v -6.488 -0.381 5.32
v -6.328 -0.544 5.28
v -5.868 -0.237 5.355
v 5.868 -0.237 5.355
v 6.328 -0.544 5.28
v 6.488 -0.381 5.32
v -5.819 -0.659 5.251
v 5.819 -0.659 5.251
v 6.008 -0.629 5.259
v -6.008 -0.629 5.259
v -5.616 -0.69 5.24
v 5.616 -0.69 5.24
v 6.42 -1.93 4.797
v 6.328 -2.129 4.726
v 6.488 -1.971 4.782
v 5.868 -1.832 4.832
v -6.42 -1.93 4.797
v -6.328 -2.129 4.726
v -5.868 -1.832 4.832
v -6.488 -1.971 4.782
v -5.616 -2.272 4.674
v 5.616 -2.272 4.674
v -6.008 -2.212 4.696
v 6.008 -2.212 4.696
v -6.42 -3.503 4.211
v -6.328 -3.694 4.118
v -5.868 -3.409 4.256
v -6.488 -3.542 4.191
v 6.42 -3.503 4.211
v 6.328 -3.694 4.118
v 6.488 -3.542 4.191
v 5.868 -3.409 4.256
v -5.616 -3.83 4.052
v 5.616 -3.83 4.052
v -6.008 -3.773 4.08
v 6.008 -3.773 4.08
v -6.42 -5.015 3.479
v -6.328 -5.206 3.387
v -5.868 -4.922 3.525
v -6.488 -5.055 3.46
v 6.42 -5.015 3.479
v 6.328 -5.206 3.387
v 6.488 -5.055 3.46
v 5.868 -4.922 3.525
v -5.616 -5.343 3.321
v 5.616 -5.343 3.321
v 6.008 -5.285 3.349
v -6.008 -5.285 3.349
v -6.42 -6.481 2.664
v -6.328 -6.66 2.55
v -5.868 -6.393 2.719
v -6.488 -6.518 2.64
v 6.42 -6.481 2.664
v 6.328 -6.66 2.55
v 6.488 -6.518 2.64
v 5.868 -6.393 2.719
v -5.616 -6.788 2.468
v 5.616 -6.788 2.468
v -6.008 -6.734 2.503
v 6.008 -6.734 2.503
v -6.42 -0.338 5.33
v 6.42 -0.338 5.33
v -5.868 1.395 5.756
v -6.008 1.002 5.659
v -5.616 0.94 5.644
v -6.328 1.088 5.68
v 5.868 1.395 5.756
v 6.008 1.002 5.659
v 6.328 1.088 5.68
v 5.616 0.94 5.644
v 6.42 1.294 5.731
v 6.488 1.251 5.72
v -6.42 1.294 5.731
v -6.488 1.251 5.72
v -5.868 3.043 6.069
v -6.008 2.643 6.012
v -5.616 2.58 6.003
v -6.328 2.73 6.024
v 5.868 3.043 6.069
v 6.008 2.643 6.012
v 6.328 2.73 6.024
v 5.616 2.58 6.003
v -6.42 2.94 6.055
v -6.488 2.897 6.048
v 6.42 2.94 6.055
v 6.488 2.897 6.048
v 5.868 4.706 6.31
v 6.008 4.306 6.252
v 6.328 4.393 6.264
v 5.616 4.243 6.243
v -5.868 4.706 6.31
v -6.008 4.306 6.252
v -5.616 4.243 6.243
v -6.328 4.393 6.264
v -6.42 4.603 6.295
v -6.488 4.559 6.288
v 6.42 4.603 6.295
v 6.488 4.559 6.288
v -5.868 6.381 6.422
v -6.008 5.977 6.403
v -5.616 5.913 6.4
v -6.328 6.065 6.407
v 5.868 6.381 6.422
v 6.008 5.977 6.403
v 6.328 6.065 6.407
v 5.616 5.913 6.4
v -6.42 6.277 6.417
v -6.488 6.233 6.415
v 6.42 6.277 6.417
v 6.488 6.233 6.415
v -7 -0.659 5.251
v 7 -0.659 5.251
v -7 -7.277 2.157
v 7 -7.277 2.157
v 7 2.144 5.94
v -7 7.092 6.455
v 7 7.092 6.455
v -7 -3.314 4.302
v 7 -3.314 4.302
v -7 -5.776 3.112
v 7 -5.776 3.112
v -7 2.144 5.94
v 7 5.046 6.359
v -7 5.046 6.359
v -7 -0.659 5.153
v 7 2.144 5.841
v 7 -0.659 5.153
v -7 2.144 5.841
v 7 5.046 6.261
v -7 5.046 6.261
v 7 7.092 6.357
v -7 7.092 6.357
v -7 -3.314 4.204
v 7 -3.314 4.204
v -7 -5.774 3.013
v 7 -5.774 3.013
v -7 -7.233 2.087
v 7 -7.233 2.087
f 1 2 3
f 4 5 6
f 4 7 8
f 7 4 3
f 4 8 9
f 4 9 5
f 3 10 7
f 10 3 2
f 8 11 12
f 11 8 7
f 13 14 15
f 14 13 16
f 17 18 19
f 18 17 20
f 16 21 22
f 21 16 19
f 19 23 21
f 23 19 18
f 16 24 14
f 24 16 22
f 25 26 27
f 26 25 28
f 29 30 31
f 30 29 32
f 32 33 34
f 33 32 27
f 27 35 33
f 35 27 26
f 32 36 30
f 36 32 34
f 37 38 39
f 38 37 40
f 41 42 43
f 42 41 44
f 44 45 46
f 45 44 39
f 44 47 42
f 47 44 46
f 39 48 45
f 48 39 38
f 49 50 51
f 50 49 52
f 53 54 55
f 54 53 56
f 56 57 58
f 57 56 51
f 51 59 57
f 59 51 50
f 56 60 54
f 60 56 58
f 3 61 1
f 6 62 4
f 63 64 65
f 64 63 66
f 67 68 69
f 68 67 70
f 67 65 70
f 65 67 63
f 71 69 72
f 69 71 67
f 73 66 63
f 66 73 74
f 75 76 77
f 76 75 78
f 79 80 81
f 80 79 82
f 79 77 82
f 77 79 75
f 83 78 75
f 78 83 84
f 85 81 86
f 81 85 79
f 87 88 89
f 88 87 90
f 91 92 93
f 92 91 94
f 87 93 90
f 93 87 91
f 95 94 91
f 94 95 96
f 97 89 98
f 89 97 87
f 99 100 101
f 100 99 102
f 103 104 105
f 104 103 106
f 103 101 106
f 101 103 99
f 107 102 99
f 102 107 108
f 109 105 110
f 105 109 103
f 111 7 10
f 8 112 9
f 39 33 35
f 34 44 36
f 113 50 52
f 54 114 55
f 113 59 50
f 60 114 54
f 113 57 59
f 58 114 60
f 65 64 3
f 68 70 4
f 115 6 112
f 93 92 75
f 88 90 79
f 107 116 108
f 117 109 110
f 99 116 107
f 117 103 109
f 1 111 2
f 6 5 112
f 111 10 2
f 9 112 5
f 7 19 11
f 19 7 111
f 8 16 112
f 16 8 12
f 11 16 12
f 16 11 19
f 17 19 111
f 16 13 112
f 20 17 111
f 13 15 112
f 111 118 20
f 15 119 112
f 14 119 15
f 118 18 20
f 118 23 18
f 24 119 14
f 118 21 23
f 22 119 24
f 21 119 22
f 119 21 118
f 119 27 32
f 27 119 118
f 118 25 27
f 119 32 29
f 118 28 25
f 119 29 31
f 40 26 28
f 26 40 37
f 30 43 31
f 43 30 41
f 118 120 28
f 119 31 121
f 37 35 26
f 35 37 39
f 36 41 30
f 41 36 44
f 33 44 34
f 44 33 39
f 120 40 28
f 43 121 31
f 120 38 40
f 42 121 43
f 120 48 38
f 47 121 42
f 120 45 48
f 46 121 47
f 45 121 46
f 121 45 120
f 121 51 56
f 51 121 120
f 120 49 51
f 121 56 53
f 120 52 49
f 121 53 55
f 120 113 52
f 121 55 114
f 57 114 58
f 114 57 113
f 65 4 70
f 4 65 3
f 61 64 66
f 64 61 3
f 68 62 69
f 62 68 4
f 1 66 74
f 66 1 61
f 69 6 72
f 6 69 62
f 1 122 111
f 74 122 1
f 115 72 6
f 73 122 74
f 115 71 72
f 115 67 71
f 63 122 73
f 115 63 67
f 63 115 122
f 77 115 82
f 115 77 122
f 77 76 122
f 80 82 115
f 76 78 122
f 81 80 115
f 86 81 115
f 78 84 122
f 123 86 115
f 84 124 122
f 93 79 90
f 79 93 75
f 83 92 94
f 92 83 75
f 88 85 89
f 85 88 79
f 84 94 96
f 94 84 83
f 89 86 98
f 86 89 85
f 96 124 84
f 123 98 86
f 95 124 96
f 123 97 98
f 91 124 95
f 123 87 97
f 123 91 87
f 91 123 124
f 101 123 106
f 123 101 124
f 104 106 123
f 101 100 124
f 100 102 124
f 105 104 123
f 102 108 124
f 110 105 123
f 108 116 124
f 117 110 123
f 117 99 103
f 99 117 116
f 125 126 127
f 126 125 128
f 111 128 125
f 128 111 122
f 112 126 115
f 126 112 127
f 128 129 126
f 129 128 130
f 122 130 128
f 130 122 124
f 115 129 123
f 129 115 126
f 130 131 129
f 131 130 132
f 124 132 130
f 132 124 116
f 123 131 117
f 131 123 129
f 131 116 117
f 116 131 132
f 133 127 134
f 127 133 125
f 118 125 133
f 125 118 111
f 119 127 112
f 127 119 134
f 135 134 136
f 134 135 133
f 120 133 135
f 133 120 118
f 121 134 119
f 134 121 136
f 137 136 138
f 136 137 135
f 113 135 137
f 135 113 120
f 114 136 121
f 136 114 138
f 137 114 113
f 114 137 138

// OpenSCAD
use <../lib.scad>
function ldraw_lib__6296256fc01() = [
// 0 Sticker  1.9 x  1.8 with 9 Air Outlet Gills (Formed)
// 0 Name: 6296256fc01.dat
// 0 Author: Magnus Forsberg [MagFors]
// 0 !LDRAW_ORG Part UPDATE 2020-03
// 0 !LICENSE Licensed under CC BY 2.0 and CC BY 4.0 : see CAreadme.txt
// 
// 0 BFC CERTIFY CCW
  [0,"BFC","CERTIFY"],
  [0,"BFC","CCW"],
// 
// 0 !KEYWORDS 500, Cinquecento, FIAT, Nuova, set 10271
// 
// 0 !HISTORY 2020-12-29 [PTadmin] Official Update 2020-03
// 
// 
// 3 0 -16.22 -13.299 -.9514 -15.82 -13.1988 -1.3593 -14.67 -13.3872 -.5921
  [3,0,-16.22,-13.299,-.9514,-15.82,-13.1988,-1.3593,-14.67,-13.3872,-.5921],
// 3 0 14.67 -13.3872 -.5921 15.82 -13.1988 -1.3593 16.22 -13.299 -.9514
  [3,0,14.67,-13.3872,-.5921,15.82,-13.1988,-1.3593,16.22,-13.299,-.9514],
// 4 0 -14.67 -13.3872 -.5921 -14.5468 -13.1279 -1.648 14.5468 -13.1279 -1.648 14.67 -13.3872 -.5921
  [4,0,-14.67,-13.3872,-.5921,-14.5468,-13.1279,-1.648,14.5468,-13.1279,-1.648,14.67,-13.3872,-.5921],
// 3 0 14.67 -13.3872 -.5921 14.5468 -13.1279 -1.648 15.02 -13.1463 -1.573
  [3,0,14.67,-13.3872,-.5921,14.5468,-13.1279,-1.648,15.02,-13.1463,-1.573],
// 3 0 14.67 -13.3872 -.5921 15.02 -13.1463 -1.573 15.82 -13.1988 -1.3593
  [3,0,14.67,-13.3872,-.5921,15.02,-13.1463,-1.573,15.82,-13.1988,-1.3593],
// 4 0 -14.67 -13.3872 -.5921 -15.82 -13.1988 -1.3593 -15.02 -13.1463 -1.573 -14.5468 -13.1279 -1.648
  [4,0,-14.67,-13.3872,-.5921,-15.82,-13.1988,-1.3593,-15.02,-13.1463,-1.573,-14.5468,-13.1279,-1.648],
// 4 0 -14.5468 -13.1279 -1.648 -14.04 -13.1 -1.7259 14.04 -13.1 -1.7259 14.5468 -13.1279 -1.648
  [4,0,-14.5468,-13.1279,-1.648,-14.04,-13.1,-1.7259,14.04,-13.1,-1.7259,14.5468,-13.1279,-1.648],
// 4 0 15.82 -11.8138 -5.3229 16.22 -11.9552 -4.9274 16.05 -11.9923 -4.8238 14.67 -12.0798 -4.579
  [4,0,15.82,-11.8138,-5.3229,16.22,-11.9552,-4.9274,16.05,-11.9923,-4.8238,14.67,-12.0798,-4.579],
// 4 0 -16.05 -11.9923 -4.8238 -16.22 -11.9552 -4.9274 -15.82 -11.8138 -5.3229 -14.67 -12.0798 -4.579
  [4,0,-16.05,-11.9923,-4.8238,-16.22,-11.9552,-4.9274,-15.82,-11.8138,-5.3229,-14.67,-12.0798,-4.579],
// 4 0 -14.67 -12.0798 -4.579 -14.04 -11.6858 -5.6807 14.04 -11.6858 -5.6807 14.67 -12.0798 -4.579
  [4,0,-14.67,-12.0798,-4.579,-14.04,-11.6858,-5.6807,14.04,-11.6858,-5.6807,14.67,-12.0798,-4.579],
// 4 0 -15.82 -11.8138 -5.3229 -15.02 -11.7397 -5.53 -14.04 -11.6858 -5.6807 -14.67 -12.0798 -4.579
  [4,0,-15.82,-11.8138,-5.3229,-15.02,-11.7397,-5.53,-14.04,-11.6858,-5.6807,-14.67,-12.0798,-4.579],
// 4 0 14.04 -11.6858 -5.6807 15.02 -11.7397 -5.53 15.82 -11.8138 -5.3229 14.67 -12.0798 -4.579
  [4,0,14.04,-11.6858,-5.6807,15.02,-11.7397,-5.53,15.82,-11.8138,-5.3229,14.67,-12.0798,-4.579],
// 4 0 -16.05 -10.5263 -8.7569 -16.22 -10.4784 -8.8559 -15.82 -10.2956 -9.234 -14.67 -10.6394 -8.5229
  [4,0,-16.05,-10.5263,-8.7569,-16.22,-10.4784,-8.8559,-15.82,-10.2956,-9.234,-14.67,-10.6394,-8.5229],
// 4 0 15.82 -10.2956 -9.234 16.22 -10.4784 -8.8559 16.05 -10.5263 -8.7569 14.67 -10.6394 -8.5229
  [4,0,15.82,-10.2956,-9.234,16.22,-10.4784,-8.8559,16.05,-10.5263,-8.7569,14.67,-10.6394,-8.5229],
// 4 0 -14.67 -10.6394 -8.5229 -14.04 -10.1302 -9.5762 14.04 -10.1302 -9.5762 14.67 -10.6394 -8.5229
  [4,0,-14.67,-10.6394,-8.5229,-14.04,-10.1302,-9.5762,14.04,-10.1302,-9.5762,14.67,-10.6394,-8.5229],
// 4 0 -15.82 -10.2956 -9.234 -15.02 -10.1998 -9.4322 -14.04 -10.1302 -9.5762 -14.67 -10.6394 -8.5229
  [4,0,-15.82,-10.2956,-9.234,-15.02,-10.1998,-9.4322,-14.04,-10.1302,-9.5762,-14.67,-10.6394,-8.5229],
// 4 0 14.04 -10.1302 -9.5762 15.02 -10.1998 -9.4322 15.82 -10.2956 -9.234 14.67 -10.6394 -8.5229
  [4,0,14.04,-10.1302,-9.5762,15.02,-10.1998,-9.4322,15.82,-10.2956,-9.234,14.67,-10.6394,-8.5229],
// 4 0 -16.05 -8.6983 -12.5382 -16.22 -8.6504 -12.6372 -15.82 -8.4676 -13.0154 -14.67 -8.8114 -12.3042
  [4,0,-16.05,-8.6983,-12.5382,-16.22,-8.6504,-12.6372,-15.82,-8.4676,-13.0154,-14.67,-8.8114,-12.3042],
// 4 0 15.82 -8.4676 -13.0154 16.22 -8.6504 -12.6372 16.05 -8.6983 -12.5382 14.67 -8.8114 -12.3042
  [4,0,15.82,-8.4676,-13.0154,16.22,-8.6504,-12.6372,16.05,-8.6983,-12.5382,14.67,-8.8114,-12.3042],
// 4 0 -14.67 -8.8114 -12.3042 -14.04 -8.3022 -13.3575 14.04 -8.3022 -13.3575 14.67 -8.8114 -12.3042
  [4,0,-14.67,-8.8114,-12.3042,-14.04,-8.3022,-13.3575,14.04,-8.3022,-13.3575,14.67,-8.8114,-12.3042],
// 4 0 14.04 -8.3022 -13.3575 15.02 -8.3718 -13.2135 15.82 -8.4676 -13.0154 14.67 -8.8114 -12.3042
  [4,0,14.04,-8.3022,-13.3575,15.02,-8.3718,-13.2135,15.82,-8.4676,-13.0154,14.67,-8.8114,-12.3042],
// 4 0 -15.82 -8.4676 -13.0154 -15.02 -8.3718 -13.2135 -14.04 -8.3022 -13.3575 -14.67 -8.8114 -12.3042
  [4,0,-15.82,-8.4676,-13.0154,-15.02,-8.3718,-13.2135,-14.04,-8.3022,-13.3575,-14.67,-8.8114,-12.3042],
// 4 0 -16.05 -6.6591 -16.2018 -16.22 -6.6 -16.2947 -15.82 -6.3748 -16.6491 -14.67 -6.7985 -15.9824
  [4,0,-16.05,-6.6591,-16.2018,-16.22,-6.6,-16.2947,-15.82,-6.3748,-16.6491,-14.67,-6.7985,-15.9824],
// 4 0 15.82 -6.3748 -16.6491 16.22 -6.6 -16.2947 16.05 -6.6591 -16.2018 14.67 -6.7985 -15.9824
  [4,0,15.82,-6.3748,-16.6491,16.22,-6.6,-16.2947,16.05,-6.6591,-16.2018,14.67,-6.7985,-15.9824],
// 4 0 -14.67 -6.7985 -15.9824 -14.04 -6.1709 -16.9698 14.04 -6.1709 -16.9698 14.67 -6.7985 -15.9824
  [4,0,-14.67,-6.7985,-15.9824,-14.04,-6.1709,-16.9698,14.04,-6.1709,-16.9698,14.67,-6.7985,-15.9824],
// 4 0 -15.82 -6.3748 -16.6491 -15.02 -6.2567 -16.8348 -14.04 -6.1709 -16.9698 -14.67 -6.7985 -15.9824
  [4,0,-15.82,-6.3748,-16.6491,-15.02,-6.2567,-16.8348,-14.04,-6.1709,-16.9698,-14.67,-6.7985,-15.9824],
// 4 0 14.04 -6.1709 -16.9698 15.02 -6.2567 -16.8348 15.82 -6.3748 -16.6491 14.67 -6.7985 -15.9824
  [4,0,14.04,-6.1709,-16.9698,15.02,-6.2567,-16.8348,15.82,-6.3748,-16.6491,14.67,-6.7985,-15.9824],
// 3 0 -14.67 -13.3872 -.5921 -16.05 -13.3252 -.8446 -16.22 -13.299 -.9514
  [3,0,-14.67,-13.3872,-.5921,-16.05,-13.3252,-.8446,-16.22,-13.299,-.9514],
// 3 0 16.22 -13.299 -.9514 16.05 -13.3252 -.8446 14.67 -13.3872 -.5921
  [3,0,16.22,-13.299,-.9514,16.05,-13.3252,-.8446,14.67,-13.3872,-.5921],
// 4 0 -14.67 -14.3889 3.4867 -15.82 -14.2005 2.7195 -15.02 -14.148 2.5058 -14.04 -14.1098 2.3505
  [4,0,-14.67,-14.3889,3.4867,-15.82,-14.2005,2.7195,-15.02,-14.148,2.5058,-14.04,-14.1098,2.3505],
// 4 0 15.02 -14.148 2.5058 15.82 -14.2005 2.7195 14.67 -14.3889 3.4867 14.04 -14.1098 2.3505
  [4,0,15.02,-14.148,2.5058,15.82,-14.2005,2.7195,14.67,-14.3889,3.4867,14.04,-14.1098,2.3505],
// 4 0 14.67 -14.3889 3.4867 -14.67 -14.3889 3.4867 -14.04 -14.1098 2.3505 14.04 -14.1098 2.3505
  [4,0,14.67,-14.3889,3.4867,-14.67,-14.3889,3.4867,-14.04,-14.1098,2.3505,14.04,-14.1098,2.3505],
// 4 0 16.22 -14.3006 3.1274 16.05 -14.3269 3.2342 14.67 -14.3889 3.4867 15.82 -14.2005 2.7195
  [4,0,16.22,-14.3006,3.1274,16.05,-14.3269,3.2342,14.67,-14.3889,3.4867,15.82,-14.2005,2.7195],
// 4 0 -14.67 -14.3889 3.4867 -16.05 -14.3269 3.2342 -16.22 -14.3006 3.1274 -15.82 -14.2005 2.7195
  [4,0,-14.67,-14.3889,3.4867,-16.05,-14.3269,3.2342,-16.22,-14.3006,3.1274,-15.82,-14.2005,2.7195],
// 4 0 -14.67 -15.1735 7.6077 -15.82 -15.0606 6.8258 -15.02 -15.0292 6.6081 -14.04 -15.0063 6.4497
  [4,0,-14.67,-15.1735,7.6077,-15.82,-15.0606,6.8258,-15.02,-15.0292,6.6081,-14.04,-15.0063,6.4497],
// 4 0 15.02 -15.0292 6.6081 15.82 -15.0606 6.8258 14.67 -15.1735 7.6077 14.04 -15.0063 6.4497
  [4,0,15.02,-15.0292,6.6081,15.82,-15.0606,6.8258,14.67,-15.1735,7.6077,14.04,-15.0063,6.4497],
// 4 0 14.67 -15.1735 7.6077 -14.67 -15.1735 7.6077 -14.04 -15.0063 6.4497 14.04 -15.0063 6.4497
  [4,0,14.67,-15.1735,7.6077,-14.67,-15.1735,7.6077,-14.04,-15.0063,6.4497,14.04,-15.0063,6.4497],
// 4 0 -14.67 -15.1735 7.6077 -16.05 -15.1364 7.3504 -16.22 -15.1206 7.2415 -15.82 -15.0606 6.8258
  [4,0,-14.67,-15.1735,7.6077,-16.05,-15.1364,7.3504,-16.22,-15.1206,7.2415,-15.82,-15.0606,6.8258],
// 4 0 16.22 -15.1206 7.2415 16.05 -15.1364 7.3504 14.67 -15.1735 7.6077 15.82 -15.0606 6.8258
  [4,0,16.22,-15.1206,7.2415,16.05,-15.1364,7.3504,14.67,-15.1735,7.6077,15.82,-15.0606,6.8258],
// 4 0 15.02 -15.6295 10.7649 15.82 -15.661 10.9827 14.67 -15.7739 11.7646 14.04 -15.6067 10.6066
  [4,0,15.02,-15.6295,10.7649,15.82,-15.661,10.9827,14.67,-15.7739,11.7646,14.04,-15.6067,10.6066],
// 4 0 -14.67 -15.7739 11.7646 -15.82 -15.661 10.9827 -15.02 -15.6295 10.7649 -14.04 -15.6067 10.6066
  [4,0,-14.67,-15.7739,11.7646,-15.82,-15.661,10.9827,-15.02,-15.6295,10.7649,-14.04,-15.6067,10.6066],
// 4 0 14.67 -15.7739 11.7646 -14.67 -15.7739 11.7646 -14.04 -15.6067 10.6066 14.04 -15.6067 10.6066
  [4,0,14.67,-15.7739,11.7646,-14.67,-15.7739,11.7646,-14.04,-15.6067,10.6066,14.04,-15.6067,10.6066],
// 4 0 -14.67 -15.7739 11.7646 -16.05 -15.7368 11.5072 -16.22 -15.721 11.3984 -15.82 -15.661 10.9827
  [4,0,-14.67,-15.7739,11.7646,-16.05,-15.7368,11.5072,-16.22,-15.721,11.3984,-15.82,-15.661,10.9827],
// 4 0 16.22 -15.721 11.3984 16.05 -15.7368 11.5072 14.67 -15.7739 11.7646 15.82 -15.661 10.9827
  [4,0,16.22,-15.721,11.3984,16.05,-15.7368,11.5072,14.67,-15.7739,11.7646,15.82,-15.661,10.9827],
// 4 0 -14.67 -16.0541 15.952 -15.82 -16.0169 15.1629 -15.02 -16.0066 14.9432 -14.04 -15.999 14.7833
  [4,0,-14.67,-16.0541,15.952,-15.82,-16.0169,15.1629,-15.02,-16.0066,14.9432,-14.04,-15.999,14.7833],
// 4 0 15.02 -16.0066 14.9432 15.82 -16.0169 15.1629 14.67 -16.0541 15.952 14.04 -15.999 14.7833
  [4,0,15.02,-16.0066,14.9432,15.82,-16.0169,15.1629,14.67,-16.0541,15.952,14.04,-15.999,14.7833],
// 4 0 14.67 -16.0541 15.952 -14.67 -16.0541 15.952 -14.04 -15.999 14.7833 14.04 -15.999 14.7833
  [4,0,14.67,-16.0541,15.952,-14.67,-16.0541,15.952,-14.04,-15.999,14.7833,14.04,-15.999,14.7833],
// 4 0 -14.67 -16.0541 15.952 -16.05 -16.0419 15.6923 -16.22 -16.0367 15.5824 -15.82 -16.0169 15.1629
  [4,0,-14.67,-16.0541,15.952,-16.05,-16.0419,15.6923,-16.22,-16.0367,15.5824,-15.82,-16.0169,15.1629],
// 4 0 16.22 -16.0367 15.5824 16.05 -16.0419 15.6923 14.67 -16.0541 15.952 15.82 -16.0169 15.1629
  [4,0,16.22,-16.0367,15.5824,16.05,-16.0419,15.6923,14.67,-16.0541,15.952,15.82,-16.0169,15.1629],
// 3 226 -17.5 -13.1279 -1.648 -14.5468 -13.1279 -1.648 -15.02 -13.1463 -1.573
  [3,226,-17.5,-13.1279,-1.648,-14.5468,-13.1279,-1.648,-15.02,-13.1463,-1.573],
// 3 226 14.5468 -13.1279 -1.648 17.5 -13.1279 -1.648 15.02 -13.1463 -1.573
  [3,226,14.5468,-13.1279,-1.648,17.5,-13.1279,-1.648,15.02,-13.1463,-1.573],
// 3 226 -14.67 -8.8114 -12.3042 -14.04 -10.1302 -9.5762 -15.02 -10.1998 -9.4322
  [3,226,-14.67,-8.8114,-12.3042,-14.04,-10.1302,-9.5762,-15.02,-10.1998,-9.4322],
// 3 226 14.04 -10.1302 -9.5762 14.67 -8.8114 -12.3042 15.02 -10.1998 -9.4322
  [3,226,14.04,-10.1302,-9.5762,14.67,-8.8114,-12.3042,15.02,-10.1998,-9.4322],
// 3 226 -17.5 -5.3931 -18.1936 -15.82 -6.3748 -16.6491 -16.22 -6.6 -16.2947
  [3,226,-17.5,-5.3931,-18.1936,-15.82,-6.3748,-16.6491,-16.22,-6.6,-16.2947],
// 3 226 15.82 -6.3748 -16.6491 17.5 -5.3931 -18.1936 16.22 -6.6 -16.2947
  [3,226,15.82,-6.3748,-16.6491,17.5,-5.3931,-18.1936,16.22,-6.6,-16.2947],
// 3 226 -17.5 -5.3931 -18.1936 -15.02 -6.2567 -16.8348 -15.82 -6.3748 -16.6491
  [3,226,-17.5,-5.3931,-18.1936,-15.02,-6.2567,-16.8348,-15.82,-6.3748,-16.6491],
// 3 226 15.02 -6.2567 -16.8348 17.5 -5.3931 -18.1936 15.82 -6.3748 -16.6491
  [3,226,15.02,-6.2567,-16.8348,17.5,-5.3931,-18.1936,15.82,-6.3748,-16.6491],
// 3 226 -17.5 -5.3931 -18.1936 -14.04 -6.1709 -16.9698 -15.02 -6.2567 -16.8348
  [3,226,-17.5,-5.3931,-18.1936,-14.04,-6.1709,-16.9698,-15.02,-6.2567,-16.8348],
// 3 226 14.04 -6.1709 -16.9698 17.5 -5.3931 -18.1936 15.02 -6.2567 -16.8348
  [3,226,14.04,-6.1709,-16.9698,17.5,-5.3931,-18.1936,15.02,-6.2567,-16.8348],
// 3 226 -14.04 -14.1098 2.3505 -15.02 -14.148 2.5058 -14.67 -13.3872 -.5921
  [3,226,-14.04,-14.1098,2.3505,-15.02,-14.148,2.5058,-14.67,-13.3872,-.5921],
// 3 226 15.02 -14.148 2.5058 14.04 -14.1098 2.3505 14.67 -13.3872 -.5921
  [3,226,15.02,-14.148,2.5058,14.04,-14.1098,2.3505,14.67,-13.3872,-.5921],
// 3 226 17.5 -14.8489 5.36 16.22 -13.299 -.9514 17.5 -13.1279 -1.648
  [3,226,17.5,-14.8489,5.36,16.22,-13.299,-.9514,17.5,-13.1279,-1.648],
// 3 226 -14.04 -15.6067 10.6066 -15.02 -15.6295 10.7649 -14.67 -15.1735 7.6077
  [3,226,-14.04,-15.6067,10.6066,-15.02,-15.6295,10.7649,-14.67,-15.1735,7.6077],
// 3 226 15.02 -15.6295 10.7649 14.04 -15.6067 10.6066 14.67 -15.1735 7.6077
  [3,226,15.02,-15.6295,10.7649,14.04,-15.6067,10.6066,14.67,-15.1735,7.6077],
// 3 226 -16.05 -16.0419 15.6923 -17.5 -16.1379 17.7301 -16.22 -16.0367 15.5824
  [3,226,-16.05,-16.0419,15.6923,-17.5,-16.1379,17.7301,-16.22,-16.0367,15.5824],
// 3 226 17.5 -16.1379 17.7301 16.05 -16.0419 15.6923 16.22 -16.0367 15.5824
  [3,226,17.5,-16.1379,17.7301,16.05,-16.0419,15.6923,16.22,-16.0367,15.5824],
// 3 226 -14.67 -16.0541 15.952 -17.5 -16.1379 17.7301 -16.05 -16.0419 15.6923
  [3,226,-14.67,-16.0541,15.952,-17.5,-16.1379,17.7301,-16.05,-16.0419,15.6923],
// 3 226 17.5 -16.1379 17.7301 14.67 -16.0541 15.952 16.05 -16.0419 15.6923
  [3,226,17.5,-16.1379,17.7301,14.67,-16.0541,15.952,16.05,-16.0419,15.6923],
// 3 226 -16.22 -13.299 -.9514 -17.5 -13.1279 -1.648 -15.82 -13.1988 -1.3593
  [3,226,-16.22,-13.299,-.9514,-17.5,-13.1279,-1.648,-15.82,-13.1988,-1.3593],
// 3 226 16.22 -13.299 -.9514 15.82 -13.1988 -1.3593 17.5 -13.1279 -1.648
  [3,226,16.22,-13.299,-.9514,15.82,-13.1988,-1.3593,17.5,-13.1279,-1.648],
// 3 226 -17.5 -13.1279 -1.648 -15.02 -13.1463 -1.573 -15.82 -13.1988 -1.3593
  [3,226,-17.5,-13.1279,-1.648,-15.02,-13.1463,-1.573,-15.82,-13.1988,-1.3593],
// 3 226 15.02 -13.1463 -1.573 17.5 -13.1279 -1.648 15.82 -13.1988 -1.3593
  [3,226,15.02,-13.1463,-1.573,17.5,-13.1279,-1.648,15.82,-13.1988,-1.3593],
// 4 226 -14.67 -12.0798 -4.579 -14.04 -13.1 -1.7259 -14.5468 -13.1279 -1.648 -17.5 -13.1279 -1.648
  [4,226,-14.67,-12.0798,-4.579,-14.04,-13.1,-1.7259,-14.5468,-13.1279,-1.648,-17.5,-13.1279,-1.648],
// 4 226 14.5468 -13.1279 -1.648 14.04 -13.1 -1.7259 14.67 -12.0798 -4.579 17.5 -13.1279 -1.648
  [4,226,14.5468,-13.1279,-1.648,14.04,-13.1,-1.7259,14.67,-12.0798,-4.579,17.5,-13.1279,-1.648],
// 4 226 -14.04 -13.1 -1.7259 -14.67 -12.0798 -4.579 14.67 -12.0798 -4.579 14.04 -13.1 -1.7259
  [4,226,-14.04,-13.1,-1.7259,-14.67,-12.0798,-4.579,14.67,-12.0798,-4.579,14.04,-13.1,-1.7259],
// 3 226 -16.05 -11.9923 -4.8238 -14.67 -12.0798 -4.579 -17.5 -13.1279 -1.648
  [3,226,-16.05,-11.9923,-4.8238,-14.67,-12.0798,-4.579,-17.5,-13.1279,-1.648],
// 3 226 14.67 -12.0798 -4.579 16.05 -11.9923 -4.8238 17.5 -13.1279 -1.648
  [3,226,14.67,-12.0798,-4.579,16.05,-11.9923,-4.8238,17.5,-13.1279,-1.648],
// 3 226 -16.22 -11.9552 -4.9274 -16.05 -11.9923 -4.8238 -17.5 -13.1279 -1.648
  [3,226,-16.22,-11.9552,-4.9274,-16.05,-11.9923,-4.8238,-17.5,-13.1279,-1.648],
// 3 226 16.05 -11.9923 -4.8238 16.22 -11.9552 -4.9274 17.5 -13.1279 -1.648
  [3,226,16.05,-11.9923,-4.8238,16.22,-11.9552,-4.9274,17.5,-13.1279,-1.648],
// 3 226 -17.5 -13.1279 -1.648 -17.5 -10.7549 -8.284 -16.22 -11.9552 -4.9274
  [3,226,-17.5,-13.1279,-1.648,-17.5,-10.7549,-8.284,-16.22,-11.9552,-4.9274],
// 3 226 16.22 -11.9552 -4.9274 17.5 -10.7549 -8.284 17.5 -13.1279 -1.648
  [3,226,16.22,-11.9552,-4.9274,17.5,-10.7549,-8.284,17.5,-13.1279,-1.648],
// 3 226 15.82 -11.8138 -5.3229 17.5 -10.7549 -8.284 16.22 -11.9552 -4.9274
  [3,226,15.82,-11.8138,-5.3229,17.5,-10.7549,-8.284,16.22,-11.9552,-4.9274],
// 3 226 -17.5 -10.7549 -8.284 -15.82 -11.8138 -5.3229 -16.22 -11.9552 -4.9274
  [3,226,-17.5,-10.7549,-8.284,-15.82,-11.8138,-5.3229,-16.22,-11.9552,-4.9274],
// 3 226 -17.5 -10.7549 -8.284 -15.02 -11.7397 -5.53 -15.82 -11.8138 -5.3229
  [3,226,-17.5,-10.7549,-8.284,-15.02,-11.7397,-5.53,-15.82,-11.8138,-5.3229],
// 3 226 15.02 -11.7397 -5.53 17.5 -10.7549 -8.284 15.82 -11.8138 -5.3229
  [3,226,15.02,-11.7397,-5.53,17.5,-10.7549,-8.284,15.82,-11.8138,-5.3229],
// 3 226 -17.5 -10.7549 -8.284 -14.04 -11.6858 -5.6807 -15.02 -11.7397 -5.53
  [3,226,-17.5,-10.7549,-8.284,-14.04,-11.6858,-5.6807,-15.02,-11.7397,-5.53],
// 3 226 14.04 -11.6858 -5.6807 17.5 -10.7549 -8.284 15.02 -11.7397 -5.53
  [3,226,14.04,-11.6858,-5.6807,17.5,-10.7549,-8.284,15.02,-11.7397,-5.53],
// 4 226 -14.04 -11.6858 -5.6807 -17.5 -10.7549 -8.284 17.5 -10.7549 -8.284 14.04 -11.6858 -5.6807
  [4,226,-14.04,-11.6858,-5.6807,-17.5,-10.7549,-8.284,17.5,-10.7549,-8.284,14.04,-11.6858,-5.6807],
// 4 226 -17.5 -10.7549 -8.284 -14.67 -10.6394 -8.5229 14.67 -10.6394 -8.5229 17.5 -10.7549 -8.284
  [4,226,-17.5,-10.7549,-8.284,-14.67,-10.6394,-8.5229,14.67,-10.6394,-8.5229,17.5,-10.7549,-8.284],
// 3 226 -17.5 -10.7549 -8.284 -16.05 -10.5263 -8.7569 -14.67 -10.6394 -8.5229
  [3,226,-17.5,-10.7549,-8.284,-16.05,-10.5263,-8.7569,-14.67,-10.6394,-8.5229],
// 3 226 17.5 -10.7549 -8.284 14.67 -10.6394 -8.5229 16.05 -10.5263 -8.7569
  [3,226,17.5,-10.7549,-8.284,14.67,-10.6394,-8.5229,16.05,-10.5263,-8.7569],
// 3 226 -17.5 -10.7549 -8.284 -16.22 -10.4784 -8.8559 -16.05 -10.5263 -8.7569
  [3,226,-17.5,-10.7549,-8.284,-16.22,-10.4784,-8.8559,-16.05,-10.5263,-8.7569],
// 3 226 17.5 -10.7549 -8.284 16.05 -10.5263 -8.7569 16.22 -10.4784 -8.8559
  [3,226,17.5,-10.7549,-8.284,16.05,-10.5263,-8.7569,16.22,-10.4784,-8.8559],
// 4 226 -16.22 -8.6504 -12.6372 -16.05 -8.6983 -12.5382 -15.82 -10.2956 -9.234 -16.22 -10.4784 -8.8559
  [4,226,-16.22,-8.6504,-12.6372,-16.05,-8.6983,-12.5382,-15.82,-10.2956,-9.234,-16.22,-10.4784,-8.8559],
// 4 226 15.82 -10.2956 -9.234 16.05 -8.6983 -12.5382 16.22 -8.6504 -12.6372 16.22 -10.4784 -8.8559
  [4,226,15.82,-10.2956,-9.234,16.05,-8.6983,-12.5382,16.22,-8.6504,-12.6372,16.22,-10.4784,-8.8559],
// 3 226 -17.5 -10.7549 -8.284 -17.5 -7.7789 -14.44 -16.22 -10.4784 -8.8559
  [3,226,-17.5,-10.7549,-8.284,-17.5,-7.7789,-14.44,-16.22,-10.4784,-8.8559],
// 3 226 17.5 -10.7549 -8.284 16.22 -10.4784 -8.8559 17.5 -7.7789 -14.44
  [3,226,17.5,-10.7549,-8.284,16.22,-10.4784,-8.8559,17.5,-7.7789,-14.44],
// 4 226 -16.05 -8.6983 -12.5382 -14.67 -8.8114 -12.3042 -15.02 -10.1998 -9.4322 -15.82 -10.2956 -9.234
  [4,226,-16.05,-8.6983,-12.5382,-14.67,-8.8114,-12.3042,-15.02,-10.1998,-9.4322,-15.82,-10.2956,-9.234],
// 4 226 15.02 -10.1998 -9.4322 14.67 -8.8114 -12.3042 16.05 -8.6983 -12.5382 15.82 -10.2956 -9.234
  [4,226,15.02,-10.1998,-9.4322,14.67,-8.8114,-12.3042,16.05,-8.6983,-12.5382,15.82,-10.2956,-9.234],
// 4 226 -14.04 -10.1302 -9.5762 -14.67 -8.8114 -12.3042 14.67 -8.8114 -12.3042 14.04 -10.1302 -9.5762
  [4,226,-14.04,-10.1302,-9.5762,-14.67,-8.8114,-12.3042,14.67,-8.8114,-12.3042,14.04,-10.1302,-9.5762],
// 3 226 -17.5 -7.7789 -14.44 -16.22 -8.6504 -12.6372 -16.22 -10.4784 -8.8559
  [3,226,-17.5,-7.7789,-14.44,-16.22,-8.6504,-12.6372,-16.22,-10.4784,-8.8559],
// 3 226 16.22 -8.6504 -12.6372 17.5 -7.7789 -14.44 16.22 -10.4784 -8.8559
  [3,226,16.22,-8.6504,-12.6372,17.5,-7.7789,-14.44,16.22,-10.4784,-8.8559],
// 3 226 -17.5 -7.7789 -14.44 -15.82 -8.4676 -13.0154 -16.22 -8.6504 -12.6372
  [3,226,-17.5,-7.7789,-14.44,-15.82,-8.4676,-13.0154,-16.22,-8.6504,-12.6372],
// 3 226 15.82 -8.4676 -13.0154 17.5 -7.7789 -14.44 16.22 -8.6504 -12.6372
  [3,226,15.82,-8.4676,-13.0154,17.5,-7.7789,-14.44,16.22,-8.6504,-12.6372],
// 3 226 -17.5 -7.7789 -14.44 -15.02 -8.3718 -13.2135 -15.82 -8.4676 -13.0154
  [3,226,-17.5,-7.7789,-14.44,-15.02,-8.3718,-13.2135,-15.82,-8.4676,-13.0154],
// 3 226 15.02 -8.3718 -13.2135 17.5 -7.7789 -14.44 15.82 -8.4676 -13.0154
  [3,226,15.02,-8.3718,-13.2135,17.5,-7.7789,-14.44,15.82,-8.4676,-13.0154],
// 3 226 -17.5 -7.7789 -14.44 -14.04 -8.3022 -13.3575 -15.02 -8.3718 -13.2135
  [3,226,-17.5,-7.7789,-14.44,-14.04,-8.3022,-13.3575,-15.02,-8.3718,-13.2135],
// 3 226 14.04 -8.3022 -13.3575 17.5 -7.7789 -14.44 15.02 -8.3718 -13.2135
  [3,226,14.04,-8.3022,-13.3575,17.5,-7.7789,-14.44,15.02,-8.3718,-13.2135],
// 4 226 -14.04 -8.3022 -13.3575 -17.5 -7.7789 -14.44 17.5 -7.7789 -14.44 14.04 -8.3022 -13.3575
  [4,226,-14.04,-8.3022,-13.3575,-17.5,-7.7789,-14.44,17.5,-7.7789,-14.44,14.04,-8.3022,-13.3575],
// 4 226 -17.5 -7.7789 -14.44 -14.67 -6.7985 -15.9824 14.67 -6.7985 -15.9824 17.5 -7.7789 -14.44
  [4,226,-17.5,-7.7789,-14.44,-14.67,-6.7985,-15.9824,14.67,-6.7985,-15.9824,17.5,-7.7789,-14.44],
// 3 226 -17.5 -7.7789 -14.44 -16.05 -6.6591 -16.2018 -14.67 -6.7985 -15.9824
  [3,226,-17.5,-7.7789,-14.44,-16.05,-6.6591,-16.2018,-14.67,-6.7985,-15.9824],
// 3 226 17.5 -7.7789 -14.44 14.67 -6.7985 -15.9824 16.05 -6.6591 -16.2018
  [3,226,17.5,-7.7789,-14.44,14.67,-6.7985,-15.9824,16.05,-6.6591,-16.2018],
// 3 226 -17.5 -7.7789 -14.44 -16.22 -6.6 -16.2947 -16.05 -6.6591 -16.2018
  [3,226,-17.5,-7.7789,-14.44,-16.22,-6.6,-16.2947,-16.05,-6.6591,-16.2018],
// 3 226 17.5 -7.7789 -14.44 16.05 -6.6591 -16.2018 16.22 -6.6 -16.2947
  [3,226,17.5,-7.7789,-14.44,16.05,-6.6591,-16.2018,16.22,-6.6,-16.2947],
// 3 226 -17.5 -7.7789 -14.44 -17.5 -5.3931 -18.1936 -16.22 -6.6 -16.2947
  [3,226,-17.5,-7.7789,-14.44,-17.5,-5.3931,-18.1936,-16.22,-6.6,-16.2947],
// 3 226 17.5 -7.7789 -14.44 16.22 -6.6 -16.2947 17.5 -5.3931 -18.1936
  [3,226,17.5,-7.7789,-14.44,16.22,-6.6,-16.2947,17.5,-5.3931,-18.1936],
// 4 226 -14.04 -6.1709 -16.9698 -17.5 -5.3931 -18.1936 17.5 -5.3931 -18.1936 14.04 -6.1709 -16.9698
  [4,226,-14.04,-6.1709,-16.9698,-17.5,-5.3931,-18.1936,17.5,-5.3931,-18.1936,14.04,-6.1709,-16.9698],
// 4 226 14.04 -14.1098 2.3505 -14.04 -14.1098 2.3505 -14.67 -13.3872 -.5921 14.67 -13.3872 -.5921
  [4,226,14.04,-14.1098,2.3505,-14.04,-14.1098,2.3505,-14.67,-13.3872,-.5921,14.67,-13.3872,-.5921],
// 4 226 -14.67 -13.3872 -.5921 -15.02 -14.148 2.5058 -15.82 -14.2005 2.7195 -16.05 -13.3252 -.8446
  [4,226,-14.67,-13.3872,-.5921,-15.02,-14.148,2.5058,-15.82,-14.2005,2.7195,-16.05,-13.3252,-.8446],
// 4 226 15.82 -14.2005 2.7195 15.02 -14.148 2.5058 14.67 -13.3872 -.5921 16.05 -13.3252 -.8446
  [4,226,15.82,-14.2005,2.7195,15.02,-14.148,2.5058,14.67,-13.3872,-.5921,16.05,-13.3252,-.8446],
// 4 226 -16.05 -13.3252 -.8446 -15.82 -14.2005 2.7195 -16.22 -14.3006 3.1274 -16.22 -13.299 -.9514
  [4,226,-16.05,-13.3252,-.8446,-15.82,-14.2005,2.7195,-16.22,-14.3006,3.1274,-16.22,-13.299,-.9514],
// 4 226 16.22 -14.3006 3.1274 15.82 -14.2005 2.7195 16.05 -13.3252 -.8446 16.22 -13.299 -.9514
  [4,226,16.22,-14.3006,3.1274,15.82,-14.2005,2.7195,16.05,-13.3252,-.8446,16.22,-13.299,-.9514],
// 3 226 -16.22 -13.299 -.9514 -17.5 -14.8489 5.36 -17.5 -13.1279 -1.648
  [3,226,-16.22,-13.299,-.9514,-17.5,-14.8489,5.36,-17.5,-13.1279,-1.648],
// 3 226 -16.22 -14.3006 3.1274 -17.5 -14.8489 5.36 -16.22 -13.299 -.9514
  [3,226,-16.22,-14.3006,3.1274,-17.5,-14.8489,5.36,-16.22,-13.299,-.9514],
// 3 226 17.5 -14.8489 5.36 16.22 -14.3006 3.1274 16.22 -13.299 -.9514
  [3,226,17.5,-14.8489,5.36,16.22,-14.3006,3.1274,16.22,-13.299,-.9514],
// 3 226 -16.05 -14.3269 3.2342 -17.5 -14.8489 5.36 -16.22 -14.3006 3.1274
  [3,226,-16.05,-14.3269,3.2342,-17.5,-14.8489,5.36,-16.22,-14.3006,3.1274],
// 3 226 17.5 -14.8489 5.36 16.05 -14.3269 3.2342 16.22 -14.3006 3.1274
  [3,226,17.5,-14.8489,5.36,16.05,-14.3269,3.2342,16.22,-14.3006,3.1274],
// 3 226 17.5 -14.8489 5.36 14.67 -14.3889 3.4867 16.05 -14.3269 3.2342
  [3,226,17.5,-14.8489,5.36,14.67,-14.3889,3.4867,16.05,-14.3269,3.2342],
// 3 226 -14.67 -14.3889 3.4867 -17.5 -14.8489 5.36 -16.05 -14.3269 3.2342
  [3,226,-14.67,-14.3889,3.4867,-17.5,-14.8489,5.36,-16.05,-14.3269,3.2342],
// 4 226 17.5 -14.8489 5.36 -17.5 -14.8489 5.36 -14.67 -14.3889 3.4867 14.67 -14.3889 3.4867
  [4,226,17.5,-14.8489,5.36,-17.5,-14.8489,5.36,-14.67,-14.3889,3.4867,14.67,-14.3889,3.4867],
// 4 226 14.04 -15.0063 6.4497 -14.04 -15.0063 6.4497 -17.5 -14.8489 5.36 17.5 -14.8489 5.36
  [4,226,14.04,-15.0063,6.4497,-14.04,-15.0063,6.4497,-17.5,-14.8489,5.36,17.5,-14.8489,5.36],
// 3 226 -14.04 -15.0063 6.4497 -15.02 -15.0292 6.6081 -17.5 -14.8489 5.36
  [3,226,-14.04,-15.0063,6.4497,-15.02,-15.0292,6.6081,-17.5,-14.8489,5.36],
// 3 226 15.02 -15.0292 6.6081 14.04 -15.0063 6.4497 17.5 -14.8489 5.36
  [3,226,15.02,-15.0292,6.6081,14.04,-15.0063,6.4497,17.5,-14.8489,5.36],
// 3 226 -15.02 -15.0292 6.6081 -15.82 -15.0606 6.8258 -17.5 -14.8489 5.36
  [3,226,-15.02,-15.0292,6.6081,-15.82,-15.0606,6.8258,-17.5,-14.8489,5.36],
// 3 226 15.82 -15.0606 6.8258 15.02 -15.0292 6.6081 17.5 -14.8489 5.36
  [3,226,15.82,-15.0606,6.8258,15.02,-15.0292,6.6081,17.5,-14.8489,5.36],
// 3 226 16.22 -15.1206 7.2415 15.82 -15.0606 6.8258 17.5 -14.8489 5.36
  [3,226,16.22,-15.1206,7.2415,15.82,-15.0606,6.8258,17.5,-14.8489,5.36],
// 3 226 -15.82 -15.0606 6.8258 -16.22 -15.1206 7.2415 -17.5 -14.8489 5.36
  [3,226,-15.82,-15.0606,6.8258,-16.22,-15.1206,7.2415,-17.5,-14.8489,5.36],
// 3 226 17.5 -15.8969 12.616 16.22 -15.1206 7.2415 17.5 -14.8489 5.36
  [3,226,17.5,-15.8969,12.616,16.22,-15.1206,7.2415,17.5,-14.8489,5.36],
// 3 226 -16.22 -15.1206 7.2415 -17.5 -15.8969 12.616 -17.5 -14.8489 5.36
  [3,226,-16.22,-15.1206,7.2415,-17.5,-15.8969,12.616,-17.5,-14.8489,5.36],
// 4 226 14.04 -15.6067 10.6066 -14.04 -15.6067 10.6066 -14.67 -15.1735 7.6077 14.67 -15.1735 7.6077
  [4,226,14.04,-15.6067,10.6066,-14.04,-15.6067,10.6066,-14.67,-15.1735,7.6077,14.67,-15.1735,7.6077],
// 4 226 -14.67 -15.1735 7.6077 -15.02 -15.6295 10.7649 -15.82 -15.661 10.9827 -16.05 -15.1364 7.3504
  [4,226,-14.67,-15.1735,7.6077,-15.02,-15.6295,10.7649,-15.82,-15.661,10.9827,-16.05,-15.1364,7.3504],
// 4 226 15.82 -15.661 10.9827 15.02 -15.6295 10.7649 14.67 -15.1735 7.6077 16.05 -15.1364 7.3504
  [4,226,15.82,-15.661,10.9827,15.02,-15.6295,10.7649,14.67,-15.1735,7.6077,16.05,-15.1364,7.3504],
// 4 226 -16.05 -15.1364 7.3504 -15.82 -15.661 10.9827 -16.22 -15.721 11.3984 -16.22 -15.1206 7.2415
  [4,226,-16.05,-15.1364,7.3504,-15.82,-15.661,10.9827,-16.22,-15.721,11.3984,-16.22,-15.1206,7.2415],
// 4 226 16.22 -15.721 11.3984 15.82 -15.661 10.9827 16.05 -15.1364 7.3504 16.22 -15.1206 7.2415
  [4,226,16.22,-15.721,11.3984,15.82,-15.661,10.9827,16.05,-15.1364,7.3504,16.22,-15.1206,7.2415],
// 3 226 -16.22 -15.721 11.3984 -17.5 -15.8969 12.616 -16.22 -15.1206 7.2415
  [3,226,-16.22,-15.721,11.3984,-17.5,-15.8969,12.616,-16.22,-15.1206,7.2415],
// 3 226 17.5 -15.8969 12.616 16.22 -15.721 11.3984 16.22 -15.1206 7.2415
  [3,226,17.5,-15.8969,12.616,16.22,-15.721,11.3984,16.22,-15.1206,7.2415],
// 3 226 -16.05 -15.7368 11.5072 -17.5 -15.8969 12.616 -16.22 -15.721 11.3984
  [3,226,-16.05,-15.7368,11.5072,-17.5,-15.8969,12.616,-16.22,-15.721,11.3984],
// 3 226 17.5 -15.8969 12.616 16.05 -15.7368 11.5072 16.22 -15.721 11.3984
  [3,226,17.5,-15.8969,12.616,16.05,-15.7368,11.5072,16.22,-15.721,11.3984],
// 3 226 -14.67 -15.7739 11.7646 -17.5 -15.8969 12.616 -16.05 -15.7368 11.5072
  [3,226,-14.67,-15.7739,11.7646,-17.5,-15.8969,12.616,-16.05,-15.7368,11.5072],
// 3 226 17.5 -15.8969 12.616 14.67 -15.7739 11.7646 16.05 -15.7368 11.5072
  [3,226,17.5,-15.8969,12.616,14.67,-15.7739,11.7646,16.05,-15.7368,11.5072],
// 4 226 17.5 -15.8969 12.616 -17.5 -15.8969 12.616 -14.67 -15.7739 11.7646 14.67 -15.7739 11.7646
  [4,226,17.5,-15.8969,12.616,-17.5,-15.8969,12.616,-14.67,-15.7739,11.7646,14.67,-15.7739,11.7646],
// 4 226 14.04 -15.999 14.7833 -14.04 -15.999 14.7833 -17.5 -15.8969 12.616 17.5 -15.8969 12.616
  [4,226,14.04,-15.999,14.7833,-14.04,-15.999,14.7833,-17.5,-15.8969,12.616,17.5,-15.8969,12.616],
// 3 226 15.02 -16.0066 14.9432 14.04 -15.999 14.7833 17.5 -15.8969 12.616
  [3,226,15.02,-16.0066,14.9432,14.04,-15.999,14.7833,17.5,-15.8969,12.616],
// 3 226 -14.04 -15.999 14.7833 -15.02 -16.0066 14.9432 -17.5 -15.8969 12.616
  [3,226,-14.04,-15.999,14.7833,-15.02,-16.0066,14.9432,-17.5,-15.8969,12.616],
// 3 226 -15.02 -16.0066 14.9432 -15.82 -16.0169 15.1629 -17.5 -15.8969 12.616
  [3,226,-15.02,-16.0066,14.9432,-15.82,-16.0169,15.1629,-17.5,-15.8969,12.616],
// 3 226 15.82 -16.0169 15.1629 15.02 -16.0066 14.9432 17.5 -15.8969 12.616
  [3,226,15.82,-16.0169,15.1629,15.02,-16.0066,14.9432,17.5,-15.8969,12.616],
// 3 226 -15.82 -16.0169 15.1629 -16.22 -16.0367 15.5824 -17.5 -15.8969 12.616
  [3,226,-15.82,-16.0169,15.1629,-16.22,-16.0367,15.5824,-17.5,-15.8969,12.616],
// 3 226 16.22 -16.0367 15.5824 15.82 -16.0169 15.1629 17.5 -15.8969 12.616
  [3,226,16.22,-16.0367,15.5824,15.82,-16.0169,15.1629,17.5,-15.8969,12.616],
// 3 226 -16.22 -16.0367 15.5824 -17.5 -16.1379 17.7301 -17.5 -15.8969 12.616
  [3,226,-16.22,-16.0367,15.5824,-17.5,-16.1379,17.7301,-17.5,-15.8969,12.616],
// 3 226 17.5 -16.1379 17.7301 16.22 -16.0367 15.5824 17.5 -15.8969 12.616
  [3,226,17.5,-16.1379,17.7301,16.22,-16.0367,15.5824,17.5,-15.8969,12.616],
// 4 226 17.5 -16.1379 17.7301 -17.5 -16.1379 17.7301 -14.67 -16.0541 15.952 14.67 -16.0541 15.952
  [4,226,17.5,-16.1379,17.7301,-17.5,-16.1379,17.7301,-14.67,-16.0541,15.952,14.67,-16.0541,15.952],
// 
// 0 // backside
// 4 16 -17.5 -12.8827 -1.648 -17.5 -14.6036 5.36 17.5 -14.6036 5.36 17.5 -12.8827 -1.648
  [4,16,-17.5,-12.8827,-1.648,-17.5,-14.6036,5.36,17.5,-14.6036,5.36,17.5,-12.8827,-1.648],
// 4 16 -17.5 -12.8827 -1.648 -17.5 -13.1279 -1.648 -17.5 -14.8489 5.36 -17.5 -14.6036 5.36
  [4,16,-17.5,-12.8827,-1.648,-17.5,-13.1279,-1.648,-17.5,-14.8489,5.36,-17.5,-14.6036,5.36],
// 4 16 17.5 -13.1279 -1.648 17.5 -12.8827 -1.648 17.5 -14.6036 5.36 17.5 -14.8489 5.36
  [4,16,17.5,-13.1279,-1.648,17.5,-12.8827,-1.648,17.5,-14.6036,5.36,17.5,-14.8489,5.36],
// 4 16 17.5 -14.6036 5.36 -17.5 -14.6036 5.36 -17.5 -15.6524 12.616 17.5 -15.6524 12.616
  [4,16,17.5,-14.6036,5.36,-17.5,-14.6036,5.36,-17.5,-15.6524,12.616,17.5,-15.6524,12.616],
// 4 16 -17.5 -14.6036 5.36 -17.5 -14.8489 5.36 -17.5 -15.8969 12.616 -17.5 -15.6524 12.616
  [4,16,-17.5,-14.6036,5.36,-17.5,-14.8489,5.36,-17.5,-15.8969,12.616,-17.5,-15.6524,12.616],
// 4 16 17.5 -14.8489 5.36 17.5 -14.6036 5.36 17.5 -15.6524 12.616 17.5 -15.8969 12.616
  [4,16,17.5,-14.8489,5.36,17.5,-14.6036,5.36,17.5,-15.6524,12.616,17.5,-15.8969,12.616],
// 4 16 -17.5 -15.6524 12.616 -17.5 -15.8932 17.7298 17.5 -15.8932 17.7298 17.5 -15.6524 12.616
  [4,16,-17.5,-15.6524,12.616,-17.5,-15.8932,17.7298,17.5,-15.8932,17.7298,17.5,-15.6524,12.616],
// 4 16 -17.5 -15.6524 12.616 -17.5 -15.8969 12.616 -17.5 -16.1379 17.7301 -17.5 -15.8932 17.7298
  [4,16,-17.5,-15.6524,12.616,-17.5,-15.8969,12.616,-17.5,-16.1379,17.7301,-17.5,-15.8932,17.7298],
// 4 16 17.5 -15.8969 12.616 17.5 -15.6524 12.616 17.5 -15.8932 17.7298 17.5 -16.1379 17.7301
  [4,16,17.5,-15.8969,12.616,17.5,-15.6524,12.616,17.5,-15.8932,17.7298,17.5,-16.1379,17.7301],
// 4 16 -17.5 -16.1379 17.7301 17.5 -16.1379 17.7301 17.5 -15.8932 17.7298 -17.5 -15.8932 17.7298
  [4,16,-17.5,-16.1379,17.7301,17.5,-16.1379,17.7301,17.5,-15.8932,17.7298,-17.5,-15.8932,17.7298],
// 4 16 17.5 -12.8827 -1.648 17.5 -10.5099 -8.284 -17.5 -10.5099 -8.284 -17.5 -12.8827 -1.648
  [4,16,17.5,-12.8827,-1.648,17.5,-10.5099,-8.284,-17.5,-10.5099,-8.284,-17.5,-12.8827,-1.648],
// 4 16 -17.5 -12.8827 -1.648 -17.5 -10.5099 -8.284 -17.5 -10.7549 -8.284 -17.5 -13.1279 -1.648
  [4,16,-17.5,-12.8827,-1.648,-17.5,-10.5099,-8.284,-17.5,-10.7549,-8.284,-17.5,-13.1279,-1.648],
// 4 16 17.5 -13.1279 -1.648 17.5 -10.7549 -8.284 17.5 -10.5099 -8.284 17.5 -12.8827 -1.648
  [4,16,17.5,-13.1279,-1.648,17.5,-10.7549,-8.284,17.5,-10.5099,-8.284,17.5,-12.8827,-1.648],
// 4 16 -17.5 -10.5099 -8.284 17.5 -10.5099 -8.284 17.5 -7.5316 -14.436 -17.5 -7.5316 -14.436
  [4,16,-17.5,-10.5099,-8.284,17.5,-10.5099,-8.284,17.5,-7.5316,-14.436,-17.5,-7.5316,-14.436],
// 4 16 -17.5 -10.7549 -8.284 -17.5 -10.5099 -8.284 -17.5 -7.5316 -14.436 -17.5 -7.7789 -14.44
  [4,16,-17.5,-10.7549,-8.284,-17.5,-10.5099,-8.284,-17.5,-7.5316,-14.436,-17.5,-7.7789,-14.44],
// 4 16 17.5 -10.5099 -8.284 17.5 -10.7549 -8.284 17.5 -7.7789 -14.44 17.5 -7.5316 -14.436
  [4,16,17.5,-10.5099,-8.284,17.5,-10.7549,-8.284,17.5,-7.7789,-14.44,17.5,-7.5316,-14.436],
// 4 16 -17.5 -7.5316 -14.436 17.5 -7.5316 -14.436 17.5 -5.2174 -18.0819 -17.5 -5.2174 -18.0819
  [4,16,-17.5,-7.5316,-14.436,17.5,-7.5316,-14.436,17.5,-5.2174,-18.0819,-17.5,-5.2174,-18.0819],
// 4 16 -17.5 -7.7789 -14.44 -17.5 -7.5316 -14.436 -17.5 -5.2174 -18.0819 -17.5 -5.3931 -18.1936
  [4,16,-17.5,-7.7789,-14.44,-17.5,-7.5316,-14.436,-17.5,-5.2174,-18.0819,-17.5,-5.3931,-18.1936],
// 4 16 17.5 -7.5316 -14.436 17.5 -7.7789 -14.44 17.5 -5.3931 -18.1936 17.5 -5.2174 -18.0819
  [4,16,17.5,-7.5316,-14.436,17.5,-7.7789,-14.44,17.5,-5.3931,-18.1936,17.5,-5.2174,-18.0819],
// 4 16 -17.5 -5.3931 -18.1936 -17.5 -5.2174 -18.0819 17.5 -5.2174 -18.0819 17.5 -5.3931 -18.1936
  [4,16,-17.5,-5.3931,-18.1936,-17.5,-5.2174,-18.0819,17.5,-5.2174,-18.0819,17.5,-5.3931,-18.1936],
// 5 24 17.5 -15.8969 12.616 -17.5 -15.8969 12.616 17.5 -16.1379 17.7301 17.5 -14.8489 5.36
  [5,24,17.5,-15.8969,12.616,-17.5,-15.8969,12.616,17.5,-16.1379,17.7301,17.5,-14.8489,5.36],
// 5 24 17.5 -14.8489 5.36 -17.5 -14.8489 5.36 17.5 -15.8969 12.616 17.5 -13.1279 -1.648
  [5,24,17.5,-14.8489,5.36,-17.5,-14.8489,5.36,17.5,-15.8969,12.616,17.5,-13.1279,-1.648],
// 5 24 17.5 -13.1279 -1.648 -17.5 -13.1279 -1.648 17.5 -14.8489 5.36 17.5 -10.7549 -8.284
  [5,24,17.5,-13.1279,-1.648,-17.5,-13.1279,-1.648,17.5,-14.8489,5.36,17.5,-10.7549,-8.284],
// 5 24 17.5 -10.7549 -8.284 -17.5 -10.7549 -8.284 17.5 -13.1279 -1.648 17.5 -7.7789 -14.44
  [5,24,17.5,-10.7549,-8.284,-17.5,-10.7549,-8.284,17.5,-13.1279,-1.648,17.5,-7.7789,-14.44],
// 5 24 17.5 -7.7789 -14.44 -17.5 -7.7789 -14.44 17.5 -10.7549 -8.284 17.5 -5.3931 -18.1936
  [5,24,17.5,-7.7789,-14.44,-17.5,-7.7789,-14.44,17.5,-10.7549,-8.284,17.5,-5.3931,-18.1936],
// 5 24 17.5 -15.6524 12.616 -17.5 -15.6524 12.616 17.5 -15.8932 17.7298 17.5 -14.6036 5.36
  [5,24,17.5,-15.6524,12.616,-17.5,-15.6524,12.616,17.5,-15.8932,17.7298,17.5,-14.6036,5.36],
// 5 24 17.5 -14.6036 5.36 -17.5 -14.6036 5.36 17.5 -15.6524 12.616 17.5 -12.8827 -1.648
  [5,24,17.5,-14.6036,5.36,-17.5,-14.6036,5.36,17.5,-15.6524,12.616,17.5,-12.8827,-1.648],
// 5 24 17.5 -12.8827 -1.648 -17.5 -12.8827 -1.648 17.5 -14.6036 5.36 17.5 -10.5099 -8.284
  [5,24,17.5,-12.8827,-1.648,-17.5,-12.8827,-1.648,17.5,-14.6036,5.36,17.5,-10.5099,-8.284],
// 5 24 17.5 -10.5099 -8.284 -17.5 -10.5099 -8.284 17.5 -12.8827 -1.648 17.5 -7.5316 -14.436
  [5,24,17.5,-10.5099,-8.284,-17.5,-10.5099,-8.284,17.5,-12.8827,-1.648,17.5,-7.5316,-14.436],
// 5 24 17.5 -7.5316 -14.436 -17.5 -7.5316 -14.436 17.5 -10.5099 -8.284 17.5 -5.2174 -18.0819
  [5,24,17.5,-7.5316,-14.436,-17.5,-7.5316,-14.436,17.5,-10.5099,-8.284,17.5,-5.2174,-18.0819],
];
makepoly(ldraw_lib__6296256fc01(), line=0.2);
